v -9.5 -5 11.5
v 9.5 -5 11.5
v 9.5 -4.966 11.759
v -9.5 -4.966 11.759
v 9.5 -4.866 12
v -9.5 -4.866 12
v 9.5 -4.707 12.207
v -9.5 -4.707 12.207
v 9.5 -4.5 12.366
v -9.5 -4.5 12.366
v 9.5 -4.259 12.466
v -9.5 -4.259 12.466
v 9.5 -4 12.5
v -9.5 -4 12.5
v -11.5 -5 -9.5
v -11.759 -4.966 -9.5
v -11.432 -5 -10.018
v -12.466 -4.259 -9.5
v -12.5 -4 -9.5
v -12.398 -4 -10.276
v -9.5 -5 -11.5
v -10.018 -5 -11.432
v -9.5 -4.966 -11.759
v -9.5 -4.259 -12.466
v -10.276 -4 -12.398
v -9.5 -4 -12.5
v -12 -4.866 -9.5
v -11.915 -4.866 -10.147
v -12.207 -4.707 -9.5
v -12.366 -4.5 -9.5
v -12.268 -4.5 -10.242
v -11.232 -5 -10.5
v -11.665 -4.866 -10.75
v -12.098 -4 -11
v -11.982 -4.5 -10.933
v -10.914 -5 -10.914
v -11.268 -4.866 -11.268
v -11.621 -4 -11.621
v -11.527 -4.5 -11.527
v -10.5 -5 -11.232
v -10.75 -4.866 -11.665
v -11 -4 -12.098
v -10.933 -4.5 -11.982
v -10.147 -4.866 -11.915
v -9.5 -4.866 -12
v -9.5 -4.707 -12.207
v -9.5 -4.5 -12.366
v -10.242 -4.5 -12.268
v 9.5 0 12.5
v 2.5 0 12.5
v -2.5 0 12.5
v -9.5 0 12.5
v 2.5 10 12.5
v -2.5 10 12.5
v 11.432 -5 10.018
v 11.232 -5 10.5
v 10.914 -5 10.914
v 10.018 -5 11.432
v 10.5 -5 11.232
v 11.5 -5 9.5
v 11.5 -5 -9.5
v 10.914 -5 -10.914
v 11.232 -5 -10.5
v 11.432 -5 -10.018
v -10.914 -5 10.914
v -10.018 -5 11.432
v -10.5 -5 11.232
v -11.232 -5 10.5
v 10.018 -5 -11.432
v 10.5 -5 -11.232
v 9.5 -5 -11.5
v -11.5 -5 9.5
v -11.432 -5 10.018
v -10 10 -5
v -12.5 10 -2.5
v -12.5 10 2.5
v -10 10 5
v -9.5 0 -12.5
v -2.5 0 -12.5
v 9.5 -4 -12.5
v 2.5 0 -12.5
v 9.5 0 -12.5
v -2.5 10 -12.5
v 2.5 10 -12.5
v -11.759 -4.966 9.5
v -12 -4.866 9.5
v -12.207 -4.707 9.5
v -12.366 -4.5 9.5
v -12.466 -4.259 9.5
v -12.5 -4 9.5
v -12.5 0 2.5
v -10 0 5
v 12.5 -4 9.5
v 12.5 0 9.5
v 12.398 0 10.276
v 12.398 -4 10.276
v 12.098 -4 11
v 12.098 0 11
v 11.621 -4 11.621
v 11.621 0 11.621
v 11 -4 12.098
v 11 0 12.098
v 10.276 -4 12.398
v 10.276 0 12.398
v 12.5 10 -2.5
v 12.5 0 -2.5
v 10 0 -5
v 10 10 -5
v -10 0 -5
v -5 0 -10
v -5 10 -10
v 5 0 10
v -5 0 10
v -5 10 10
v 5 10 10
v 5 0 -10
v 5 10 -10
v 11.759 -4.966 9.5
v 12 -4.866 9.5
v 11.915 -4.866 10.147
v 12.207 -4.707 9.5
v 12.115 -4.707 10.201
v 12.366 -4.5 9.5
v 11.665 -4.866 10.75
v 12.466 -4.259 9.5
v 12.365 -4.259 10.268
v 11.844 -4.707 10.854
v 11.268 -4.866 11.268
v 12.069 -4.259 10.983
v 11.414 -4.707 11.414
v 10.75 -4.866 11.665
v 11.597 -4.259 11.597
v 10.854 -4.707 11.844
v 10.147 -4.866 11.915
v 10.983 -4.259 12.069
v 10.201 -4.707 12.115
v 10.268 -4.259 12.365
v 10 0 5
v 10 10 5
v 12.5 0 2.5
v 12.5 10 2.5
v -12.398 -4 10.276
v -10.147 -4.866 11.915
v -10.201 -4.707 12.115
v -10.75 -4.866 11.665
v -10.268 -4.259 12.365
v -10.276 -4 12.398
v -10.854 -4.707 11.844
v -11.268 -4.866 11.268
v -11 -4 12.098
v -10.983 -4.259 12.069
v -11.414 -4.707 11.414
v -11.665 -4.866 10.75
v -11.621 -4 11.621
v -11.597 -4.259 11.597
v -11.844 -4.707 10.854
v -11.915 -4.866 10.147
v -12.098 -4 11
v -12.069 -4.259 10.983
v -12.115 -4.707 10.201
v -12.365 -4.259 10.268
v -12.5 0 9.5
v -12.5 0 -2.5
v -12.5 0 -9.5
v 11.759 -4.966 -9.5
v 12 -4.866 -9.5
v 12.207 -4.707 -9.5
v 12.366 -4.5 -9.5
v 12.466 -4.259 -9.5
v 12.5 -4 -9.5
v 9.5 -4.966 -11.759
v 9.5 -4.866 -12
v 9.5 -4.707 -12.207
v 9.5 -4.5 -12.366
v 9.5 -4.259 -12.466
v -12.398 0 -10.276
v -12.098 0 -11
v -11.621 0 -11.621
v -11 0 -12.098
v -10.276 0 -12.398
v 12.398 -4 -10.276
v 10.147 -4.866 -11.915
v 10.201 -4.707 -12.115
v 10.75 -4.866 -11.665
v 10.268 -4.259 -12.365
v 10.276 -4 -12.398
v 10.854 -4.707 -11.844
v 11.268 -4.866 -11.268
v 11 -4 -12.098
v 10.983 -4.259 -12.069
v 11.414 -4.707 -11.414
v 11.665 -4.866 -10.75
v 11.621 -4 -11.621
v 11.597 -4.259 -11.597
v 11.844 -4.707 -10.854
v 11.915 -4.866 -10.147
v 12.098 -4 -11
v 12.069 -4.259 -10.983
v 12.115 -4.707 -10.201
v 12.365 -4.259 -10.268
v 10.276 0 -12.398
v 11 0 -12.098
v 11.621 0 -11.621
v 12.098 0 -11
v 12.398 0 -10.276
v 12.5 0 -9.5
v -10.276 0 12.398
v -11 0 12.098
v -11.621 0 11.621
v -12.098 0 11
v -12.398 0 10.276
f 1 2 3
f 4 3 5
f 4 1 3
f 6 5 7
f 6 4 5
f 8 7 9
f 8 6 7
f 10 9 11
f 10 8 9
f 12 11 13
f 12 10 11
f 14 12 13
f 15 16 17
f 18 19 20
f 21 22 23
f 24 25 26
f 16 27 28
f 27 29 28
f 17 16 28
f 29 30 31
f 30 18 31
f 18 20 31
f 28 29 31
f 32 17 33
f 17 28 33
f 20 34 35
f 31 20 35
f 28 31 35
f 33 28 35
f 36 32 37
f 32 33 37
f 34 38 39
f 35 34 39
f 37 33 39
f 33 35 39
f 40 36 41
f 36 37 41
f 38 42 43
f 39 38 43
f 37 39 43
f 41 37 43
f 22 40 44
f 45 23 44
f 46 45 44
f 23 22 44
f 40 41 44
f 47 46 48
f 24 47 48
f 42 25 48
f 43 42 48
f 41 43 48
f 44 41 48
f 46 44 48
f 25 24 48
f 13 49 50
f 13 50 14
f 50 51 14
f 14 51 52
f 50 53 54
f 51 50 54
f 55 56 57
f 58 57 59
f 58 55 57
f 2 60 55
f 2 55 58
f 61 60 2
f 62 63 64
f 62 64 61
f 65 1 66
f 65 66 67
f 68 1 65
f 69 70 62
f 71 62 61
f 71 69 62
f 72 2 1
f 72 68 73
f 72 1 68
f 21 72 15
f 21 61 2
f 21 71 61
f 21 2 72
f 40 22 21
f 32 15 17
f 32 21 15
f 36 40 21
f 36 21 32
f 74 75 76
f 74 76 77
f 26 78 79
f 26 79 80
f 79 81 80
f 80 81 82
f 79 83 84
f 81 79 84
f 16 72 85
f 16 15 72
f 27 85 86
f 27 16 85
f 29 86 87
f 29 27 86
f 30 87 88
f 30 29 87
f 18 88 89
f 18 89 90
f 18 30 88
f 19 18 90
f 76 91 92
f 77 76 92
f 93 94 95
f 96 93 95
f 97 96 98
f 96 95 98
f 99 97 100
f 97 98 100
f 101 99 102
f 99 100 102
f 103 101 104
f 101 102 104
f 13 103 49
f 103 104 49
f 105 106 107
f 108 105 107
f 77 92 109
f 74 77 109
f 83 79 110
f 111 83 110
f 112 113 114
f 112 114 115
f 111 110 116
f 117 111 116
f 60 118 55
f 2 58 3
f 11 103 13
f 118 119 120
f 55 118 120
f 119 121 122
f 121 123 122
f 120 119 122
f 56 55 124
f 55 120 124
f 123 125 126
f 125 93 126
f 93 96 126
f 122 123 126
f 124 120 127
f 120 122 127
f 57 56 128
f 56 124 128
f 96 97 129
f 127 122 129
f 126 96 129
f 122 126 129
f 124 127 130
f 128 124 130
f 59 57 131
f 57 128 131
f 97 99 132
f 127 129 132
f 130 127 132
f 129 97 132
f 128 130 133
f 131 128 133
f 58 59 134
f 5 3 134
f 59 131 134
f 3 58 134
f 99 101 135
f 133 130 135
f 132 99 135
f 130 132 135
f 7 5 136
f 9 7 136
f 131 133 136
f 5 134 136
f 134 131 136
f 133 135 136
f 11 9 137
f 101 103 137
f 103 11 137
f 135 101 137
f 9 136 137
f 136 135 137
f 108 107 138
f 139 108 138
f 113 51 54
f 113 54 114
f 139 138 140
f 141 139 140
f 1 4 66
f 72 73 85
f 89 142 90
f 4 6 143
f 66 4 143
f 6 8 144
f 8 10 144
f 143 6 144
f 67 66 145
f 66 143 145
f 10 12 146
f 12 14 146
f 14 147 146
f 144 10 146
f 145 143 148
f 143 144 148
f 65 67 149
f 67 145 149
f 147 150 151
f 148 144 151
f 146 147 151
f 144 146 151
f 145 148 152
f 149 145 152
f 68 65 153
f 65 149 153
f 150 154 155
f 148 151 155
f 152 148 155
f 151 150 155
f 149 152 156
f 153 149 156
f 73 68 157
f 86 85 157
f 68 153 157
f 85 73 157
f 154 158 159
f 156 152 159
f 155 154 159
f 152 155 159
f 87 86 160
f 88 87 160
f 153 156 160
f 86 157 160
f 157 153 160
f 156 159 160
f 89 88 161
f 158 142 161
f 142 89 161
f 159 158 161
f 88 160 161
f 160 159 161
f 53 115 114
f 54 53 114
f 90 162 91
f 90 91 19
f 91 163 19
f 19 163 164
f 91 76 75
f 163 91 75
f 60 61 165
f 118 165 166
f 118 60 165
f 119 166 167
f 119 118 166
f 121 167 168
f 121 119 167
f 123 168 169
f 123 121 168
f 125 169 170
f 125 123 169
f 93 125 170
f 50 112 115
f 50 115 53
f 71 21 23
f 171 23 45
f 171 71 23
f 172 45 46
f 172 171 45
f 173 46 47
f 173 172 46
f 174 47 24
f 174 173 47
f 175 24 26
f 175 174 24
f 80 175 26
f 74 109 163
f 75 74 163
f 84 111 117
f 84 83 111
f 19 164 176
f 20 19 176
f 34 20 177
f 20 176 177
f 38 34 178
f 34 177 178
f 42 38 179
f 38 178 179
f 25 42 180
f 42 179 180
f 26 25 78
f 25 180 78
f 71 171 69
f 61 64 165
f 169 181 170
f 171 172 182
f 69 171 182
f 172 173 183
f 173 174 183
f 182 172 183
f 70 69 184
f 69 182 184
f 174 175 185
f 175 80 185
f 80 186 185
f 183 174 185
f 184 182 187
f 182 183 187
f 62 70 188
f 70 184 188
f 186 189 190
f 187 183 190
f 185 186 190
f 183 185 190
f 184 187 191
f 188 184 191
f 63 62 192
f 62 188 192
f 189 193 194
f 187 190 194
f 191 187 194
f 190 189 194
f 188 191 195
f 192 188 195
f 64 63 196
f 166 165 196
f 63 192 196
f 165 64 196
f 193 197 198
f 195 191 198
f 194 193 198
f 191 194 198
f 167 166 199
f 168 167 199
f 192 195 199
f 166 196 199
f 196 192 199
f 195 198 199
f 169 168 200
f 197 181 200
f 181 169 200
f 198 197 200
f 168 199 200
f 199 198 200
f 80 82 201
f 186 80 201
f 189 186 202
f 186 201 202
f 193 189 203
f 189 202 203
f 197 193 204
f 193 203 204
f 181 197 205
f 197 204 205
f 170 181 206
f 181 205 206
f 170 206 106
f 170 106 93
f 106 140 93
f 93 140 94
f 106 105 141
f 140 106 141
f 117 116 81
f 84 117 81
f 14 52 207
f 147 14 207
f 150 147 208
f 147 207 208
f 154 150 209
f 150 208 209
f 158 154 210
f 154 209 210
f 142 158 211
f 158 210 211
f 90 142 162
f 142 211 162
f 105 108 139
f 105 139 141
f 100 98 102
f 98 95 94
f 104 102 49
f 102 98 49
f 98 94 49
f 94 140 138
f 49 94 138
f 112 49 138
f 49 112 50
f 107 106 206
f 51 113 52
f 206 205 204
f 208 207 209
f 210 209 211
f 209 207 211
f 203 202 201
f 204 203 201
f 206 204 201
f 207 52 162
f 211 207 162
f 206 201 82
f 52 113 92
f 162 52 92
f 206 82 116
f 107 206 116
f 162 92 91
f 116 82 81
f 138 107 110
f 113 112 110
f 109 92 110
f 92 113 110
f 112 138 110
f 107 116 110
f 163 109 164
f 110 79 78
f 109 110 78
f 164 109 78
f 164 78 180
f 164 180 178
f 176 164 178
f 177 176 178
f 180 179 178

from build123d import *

# Parameters (mm, degrees)
BOSS_EXTRUDE1_DEPTH   = 10
BOSS_EXTRUDE1_2_DEPTH = 10
BOSS_EXTRUDE1_3_DEPTH = 10
BOSS_EXTRUDE1_4_DEPTH = 10
BOSS_EXTRUDE2_DEPTH   = 5
FILLET1_R             = 1


with BuildPart() as part:
    # Sketch3 → Boss-Extrude1 (new body)
    with BuildSketch(Plane(origin=(0, 0, 0), x_dir=(1, 0, 0), z_dir=(0, 1, 0))):
        Polygon((2.5, 12.5), (-2.5, 12.5), (-5, 10), (5, 10), align=None)
    extrude(amount=BOSS_EXTRUDE1_DEPTH)



with BuildPart() as body_2:
    # Sketch3 → Boss-Extrude1 2 (new body)
    with BuildSketch(Plane(origin=(0, 0, 0), x_dir=(1, 0, 0), z_dir=(0, 1, 0))):
        Polygon((-10, 5), (-12.5, 2.5), (-12.5, -2.5), (-10, -5), align=None)
    extrude(amount=BOSS_EXTRUDE1_2_DEPTH)


with BuildPart() as body_3:
    # Sketch3 → Boss-Extrude1 3 (new body)
    with BuildSketch(Plane(origin=(0, 0, 0), x_dir=(1, 0, 0), z_dir=(0, 1, 0))):
        Polygon((12.5, -2.5), (12.5, 2.5), (10, 5), (10, -5), align=None)
    extrude(amount=BOSS_EXTRUDE1_3_DEPTH)


with BuildPart() as body_4:
    # Sketch3 → Boss-Extrude1 4 (new body)
    with BuildSketch(Plane(origin=(0, 0, 0), x_dir=(1, 0, 0), z_dir=(0, 1, 0))):
        Polygon((-5, -10), (-2.5, -12.5), (2.5, -12.5), (5, -10), align=None)
    extrude(amount=BOSS_EXTRUDE1_4_DEPTH)


with BuildPart() as part_1:
    add(part.part)

    add(body_2.part)  # Boss-Extrude2 merges body 2

    add(body_3.part)  # Boss-Extrude2 merges body 3

    add(body_4.part)  # Boss-Extrude2 merges body 4
    # Sketch3<4> → Boss-Extrude2 (add)
    with BuildSketch(Plane(origin=(0, 0, 0), x_dir=(1, 0, 0), z_dir=(0, 1, 0))):
        with BuildLine():
            ThreePointArc((-9.5, 12.5), (-11.621320344, 11.621320344), (-12.5, 9.5))
            Line((-12.5, 9.5), (-12.5, -9.5))
            ThreePointArc((-12.5, -9.5), (-11.621320344, -11.621320344), (-9.5, -12.5))
            Line((-9.5, -12.5), (9.5, -12.5))
            ThreePointArc((9.5, -12.5), (11.621320344, -11.621320344), (12.5, -9.5))
            Line((12.5, -9.5), (12.5, 9.5))
            ThreePointArc((12.5, 9.5), (11.621320344, 11.621320344), (9.5, 12.5))
            Line((9.5, 12.5), (-9.5, 12.5))
        make_face()
    extrude(amount=-BOSS_EXTRUDE2_DEPTH)

    # Fillet1
    fillet1_edges = [part_1.edges().sort_by_distance(p)[0] for p in [
        (-11.621320344, -5, 11.621320344),
        (0, -5, 12.5),
        (11.621320344, -5, 11.621320344),
        (12.5, -5, 0),
        (11.621320344, -5, -11.621320344),
        (0, -5, -12.5),
        (-11.621320344, -5, -11.621320344),
        (-12.5, -5, 0),
    ]]
    fillet(fillet1_edges, radius=FILLET1_R)


solid = part_1.part
